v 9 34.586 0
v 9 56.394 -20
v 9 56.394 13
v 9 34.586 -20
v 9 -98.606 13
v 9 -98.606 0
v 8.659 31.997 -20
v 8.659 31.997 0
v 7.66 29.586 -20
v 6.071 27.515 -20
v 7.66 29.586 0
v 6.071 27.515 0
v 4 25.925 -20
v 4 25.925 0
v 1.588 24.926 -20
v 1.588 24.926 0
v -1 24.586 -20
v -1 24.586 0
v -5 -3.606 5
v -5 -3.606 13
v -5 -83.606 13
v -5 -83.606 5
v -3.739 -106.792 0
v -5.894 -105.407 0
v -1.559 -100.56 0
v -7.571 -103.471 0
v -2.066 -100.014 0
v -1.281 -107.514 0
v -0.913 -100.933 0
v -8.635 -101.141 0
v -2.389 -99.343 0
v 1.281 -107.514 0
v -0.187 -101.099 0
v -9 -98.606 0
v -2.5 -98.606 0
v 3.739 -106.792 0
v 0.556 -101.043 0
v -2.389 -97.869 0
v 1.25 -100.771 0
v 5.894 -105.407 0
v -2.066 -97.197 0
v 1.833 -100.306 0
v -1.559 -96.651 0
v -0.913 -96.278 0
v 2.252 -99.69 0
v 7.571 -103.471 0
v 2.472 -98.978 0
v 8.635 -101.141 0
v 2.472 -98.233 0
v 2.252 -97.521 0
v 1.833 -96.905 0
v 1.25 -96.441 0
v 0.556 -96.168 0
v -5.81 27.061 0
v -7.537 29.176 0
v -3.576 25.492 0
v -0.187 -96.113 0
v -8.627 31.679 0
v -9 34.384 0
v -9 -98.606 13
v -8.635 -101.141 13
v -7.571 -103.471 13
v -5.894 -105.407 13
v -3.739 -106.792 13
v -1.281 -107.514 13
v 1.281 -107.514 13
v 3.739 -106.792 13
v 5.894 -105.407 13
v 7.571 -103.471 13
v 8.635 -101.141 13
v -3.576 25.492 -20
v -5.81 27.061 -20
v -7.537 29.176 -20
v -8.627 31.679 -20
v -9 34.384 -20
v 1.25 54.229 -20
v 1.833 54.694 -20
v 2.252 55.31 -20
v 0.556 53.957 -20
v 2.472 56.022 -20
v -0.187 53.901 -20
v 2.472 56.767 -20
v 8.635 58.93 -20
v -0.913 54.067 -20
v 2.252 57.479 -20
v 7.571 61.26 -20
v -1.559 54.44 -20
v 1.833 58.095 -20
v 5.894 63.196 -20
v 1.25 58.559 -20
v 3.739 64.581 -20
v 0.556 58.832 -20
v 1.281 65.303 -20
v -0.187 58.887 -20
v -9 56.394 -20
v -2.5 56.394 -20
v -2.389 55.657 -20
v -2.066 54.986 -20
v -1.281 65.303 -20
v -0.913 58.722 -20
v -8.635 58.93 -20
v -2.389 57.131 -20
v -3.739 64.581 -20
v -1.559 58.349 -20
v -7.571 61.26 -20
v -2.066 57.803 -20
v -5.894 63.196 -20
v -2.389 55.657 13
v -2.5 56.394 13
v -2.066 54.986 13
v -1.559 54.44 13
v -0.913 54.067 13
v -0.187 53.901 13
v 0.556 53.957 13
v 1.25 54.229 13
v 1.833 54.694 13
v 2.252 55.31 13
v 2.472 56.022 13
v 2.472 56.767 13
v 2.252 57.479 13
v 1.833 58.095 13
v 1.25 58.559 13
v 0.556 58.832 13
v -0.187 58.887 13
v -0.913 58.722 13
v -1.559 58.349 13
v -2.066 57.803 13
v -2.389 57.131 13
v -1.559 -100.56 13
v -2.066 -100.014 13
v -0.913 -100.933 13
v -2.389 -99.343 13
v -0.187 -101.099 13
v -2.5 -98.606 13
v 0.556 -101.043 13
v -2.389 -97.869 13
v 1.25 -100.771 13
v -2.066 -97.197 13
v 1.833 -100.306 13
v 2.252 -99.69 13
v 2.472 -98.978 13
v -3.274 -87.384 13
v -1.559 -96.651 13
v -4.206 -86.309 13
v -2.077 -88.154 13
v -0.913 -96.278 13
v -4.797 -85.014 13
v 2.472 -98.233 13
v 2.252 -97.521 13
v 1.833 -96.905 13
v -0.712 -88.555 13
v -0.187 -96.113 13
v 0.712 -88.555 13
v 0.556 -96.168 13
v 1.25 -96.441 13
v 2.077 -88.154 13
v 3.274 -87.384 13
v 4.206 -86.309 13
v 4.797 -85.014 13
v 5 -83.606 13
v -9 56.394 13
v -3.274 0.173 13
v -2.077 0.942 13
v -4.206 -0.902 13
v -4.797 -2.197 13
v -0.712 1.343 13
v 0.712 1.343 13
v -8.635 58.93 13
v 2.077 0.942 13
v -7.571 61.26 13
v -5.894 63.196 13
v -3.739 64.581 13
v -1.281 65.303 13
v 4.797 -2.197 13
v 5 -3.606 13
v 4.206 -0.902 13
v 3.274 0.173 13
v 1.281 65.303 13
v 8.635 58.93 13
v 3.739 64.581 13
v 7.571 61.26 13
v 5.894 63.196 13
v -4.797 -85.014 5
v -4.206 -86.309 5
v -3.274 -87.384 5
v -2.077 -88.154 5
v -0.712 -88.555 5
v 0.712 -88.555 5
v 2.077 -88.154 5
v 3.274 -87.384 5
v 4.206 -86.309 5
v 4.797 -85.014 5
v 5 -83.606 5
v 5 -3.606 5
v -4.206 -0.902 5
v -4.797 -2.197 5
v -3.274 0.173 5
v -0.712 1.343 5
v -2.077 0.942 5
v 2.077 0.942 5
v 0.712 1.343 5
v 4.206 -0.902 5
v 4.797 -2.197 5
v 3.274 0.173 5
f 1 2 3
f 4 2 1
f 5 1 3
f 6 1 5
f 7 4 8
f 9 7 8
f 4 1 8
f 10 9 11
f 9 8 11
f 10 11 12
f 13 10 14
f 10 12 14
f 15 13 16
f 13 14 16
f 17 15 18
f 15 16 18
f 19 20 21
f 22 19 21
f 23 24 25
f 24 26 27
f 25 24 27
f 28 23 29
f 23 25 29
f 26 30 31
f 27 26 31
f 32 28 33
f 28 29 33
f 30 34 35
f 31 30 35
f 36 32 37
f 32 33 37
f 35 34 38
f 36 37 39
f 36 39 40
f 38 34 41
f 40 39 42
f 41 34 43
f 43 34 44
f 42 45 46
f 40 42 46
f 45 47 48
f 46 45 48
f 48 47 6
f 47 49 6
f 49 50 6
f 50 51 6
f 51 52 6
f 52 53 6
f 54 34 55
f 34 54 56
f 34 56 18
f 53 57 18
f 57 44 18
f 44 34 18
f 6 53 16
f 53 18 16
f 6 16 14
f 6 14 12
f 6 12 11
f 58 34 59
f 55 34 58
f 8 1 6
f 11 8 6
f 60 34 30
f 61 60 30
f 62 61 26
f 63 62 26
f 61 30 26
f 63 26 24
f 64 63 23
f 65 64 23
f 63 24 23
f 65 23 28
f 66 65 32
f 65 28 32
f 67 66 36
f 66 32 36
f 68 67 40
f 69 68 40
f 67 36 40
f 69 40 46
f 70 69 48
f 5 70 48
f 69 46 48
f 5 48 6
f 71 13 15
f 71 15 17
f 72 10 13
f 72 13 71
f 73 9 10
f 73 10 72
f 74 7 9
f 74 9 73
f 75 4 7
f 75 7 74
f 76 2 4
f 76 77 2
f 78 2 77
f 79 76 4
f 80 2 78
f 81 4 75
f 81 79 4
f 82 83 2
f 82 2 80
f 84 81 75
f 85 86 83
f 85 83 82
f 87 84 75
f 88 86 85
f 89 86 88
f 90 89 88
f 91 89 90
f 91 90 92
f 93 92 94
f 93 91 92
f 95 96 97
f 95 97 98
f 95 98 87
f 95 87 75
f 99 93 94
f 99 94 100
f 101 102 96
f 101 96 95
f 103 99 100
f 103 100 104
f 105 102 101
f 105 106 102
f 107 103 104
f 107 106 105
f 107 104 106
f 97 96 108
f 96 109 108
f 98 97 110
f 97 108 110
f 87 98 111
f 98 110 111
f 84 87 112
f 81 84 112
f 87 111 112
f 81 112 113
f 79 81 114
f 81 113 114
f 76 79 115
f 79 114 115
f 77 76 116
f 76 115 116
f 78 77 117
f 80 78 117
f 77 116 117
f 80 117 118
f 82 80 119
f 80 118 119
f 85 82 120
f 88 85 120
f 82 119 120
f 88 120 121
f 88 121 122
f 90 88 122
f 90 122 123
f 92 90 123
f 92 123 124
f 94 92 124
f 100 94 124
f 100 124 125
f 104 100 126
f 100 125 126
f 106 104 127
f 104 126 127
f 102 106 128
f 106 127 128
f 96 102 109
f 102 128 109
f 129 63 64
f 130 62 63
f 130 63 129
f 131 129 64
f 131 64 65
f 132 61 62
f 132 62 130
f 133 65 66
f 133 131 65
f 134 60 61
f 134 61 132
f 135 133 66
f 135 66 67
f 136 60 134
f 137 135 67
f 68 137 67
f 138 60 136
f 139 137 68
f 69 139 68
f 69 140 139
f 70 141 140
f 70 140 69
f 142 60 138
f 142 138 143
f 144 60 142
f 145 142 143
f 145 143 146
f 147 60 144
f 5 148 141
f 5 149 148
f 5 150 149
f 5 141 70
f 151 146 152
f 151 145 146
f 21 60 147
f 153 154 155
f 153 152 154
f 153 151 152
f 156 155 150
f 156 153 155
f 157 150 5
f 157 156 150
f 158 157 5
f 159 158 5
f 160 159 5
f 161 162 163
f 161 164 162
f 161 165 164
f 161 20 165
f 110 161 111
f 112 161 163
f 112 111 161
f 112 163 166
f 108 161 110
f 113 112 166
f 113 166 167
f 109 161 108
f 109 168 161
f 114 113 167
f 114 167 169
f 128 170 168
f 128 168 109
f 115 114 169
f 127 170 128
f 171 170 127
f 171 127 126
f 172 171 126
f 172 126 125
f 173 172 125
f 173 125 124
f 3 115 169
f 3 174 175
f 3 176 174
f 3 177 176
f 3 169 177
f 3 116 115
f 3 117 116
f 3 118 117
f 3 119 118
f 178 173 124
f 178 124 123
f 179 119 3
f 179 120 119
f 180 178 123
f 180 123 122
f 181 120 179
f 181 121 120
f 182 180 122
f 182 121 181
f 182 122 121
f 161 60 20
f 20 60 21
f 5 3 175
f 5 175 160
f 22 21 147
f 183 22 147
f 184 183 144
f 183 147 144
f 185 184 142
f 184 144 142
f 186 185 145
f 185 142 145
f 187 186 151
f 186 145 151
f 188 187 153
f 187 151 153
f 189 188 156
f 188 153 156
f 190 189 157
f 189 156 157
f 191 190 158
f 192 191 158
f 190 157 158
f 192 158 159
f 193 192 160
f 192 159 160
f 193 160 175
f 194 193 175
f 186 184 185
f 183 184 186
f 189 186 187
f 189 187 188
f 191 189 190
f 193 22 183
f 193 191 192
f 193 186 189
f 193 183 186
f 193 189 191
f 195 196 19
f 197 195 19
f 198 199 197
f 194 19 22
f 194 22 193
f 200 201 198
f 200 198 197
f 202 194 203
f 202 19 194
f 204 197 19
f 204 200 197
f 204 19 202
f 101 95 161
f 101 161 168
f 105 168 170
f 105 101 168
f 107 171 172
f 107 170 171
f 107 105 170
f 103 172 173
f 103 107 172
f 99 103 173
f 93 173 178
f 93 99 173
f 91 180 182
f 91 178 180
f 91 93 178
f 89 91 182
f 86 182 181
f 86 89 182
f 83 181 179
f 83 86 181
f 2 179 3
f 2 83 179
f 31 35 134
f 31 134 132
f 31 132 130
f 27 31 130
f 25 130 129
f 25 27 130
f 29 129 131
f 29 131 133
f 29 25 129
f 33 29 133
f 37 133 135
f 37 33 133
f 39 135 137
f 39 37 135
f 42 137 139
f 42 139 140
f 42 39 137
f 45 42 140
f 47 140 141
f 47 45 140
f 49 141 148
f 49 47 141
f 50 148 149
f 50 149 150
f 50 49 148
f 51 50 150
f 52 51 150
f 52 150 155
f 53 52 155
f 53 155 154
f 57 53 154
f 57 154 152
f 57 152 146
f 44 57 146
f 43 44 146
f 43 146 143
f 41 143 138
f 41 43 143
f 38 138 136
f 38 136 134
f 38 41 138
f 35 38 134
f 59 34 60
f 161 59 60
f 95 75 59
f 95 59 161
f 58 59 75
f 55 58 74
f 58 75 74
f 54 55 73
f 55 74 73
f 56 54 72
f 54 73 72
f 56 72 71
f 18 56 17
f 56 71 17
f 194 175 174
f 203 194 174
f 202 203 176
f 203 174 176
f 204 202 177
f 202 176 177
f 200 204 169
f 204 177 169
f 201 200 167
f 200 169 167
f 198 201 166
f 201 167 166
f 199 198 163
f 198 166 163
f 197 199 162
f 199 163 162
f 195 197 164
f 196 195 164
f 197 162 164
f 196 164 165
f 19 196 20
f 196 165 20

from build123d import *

# Parameters (mm, degrees)
SKETCH1_R      = 2.5
EXTRUDE1_DEPTH = 13
EXTRUDE2_DEPTH = 8
EXTRUDE3_START = 20
EXTRUDE3_DEPTH = 20
FILLET1_R      = 10
FILLET2_R      = 10
SKETCH4_R      = 2.5
EXTRUDE4_DEPTH = 113.911387675


with BuildPart() as part:
    # Sketch1 → Extrude1 (new body)
    with BuildSketch(Plane.XY):
        with BuildLine():
            Line((-9, 56.394324189), (-9, -98.605675811))
            ThreePointArc((-9, -98.605675811), (0, -107.605675811), (9, -98.605675811))
            Line((9, -98.605675811), (9, 56.394324189))
            ThreePointArc((9, 56.394324189), (0, 65.394324189), (-9, 56.394324189))
        make_face()
        with Locations(Location((0, 56.394324189, 0), (0, 0, 180))):
            Circle(SKETCH1_R, mode=Mode.SUBTRACT)
        with Locations(Location((0, -98.605675811, 0), (0, 0, 180))):
            Circle(SKETCH1_R, mode=Mode.SUBTRACT)
    extrude(amount=EXTRUDE1_DEPTH)

    # Sketch2 → Extrude2 (cut)
    with BuildSketch(Plane.XY.offset(13)):
        with BuildLine():
            Line((-5, -3.605675811), (-5, -83.605675811))
            ThreePointArc((-5, -83.605675811), (0, -88.605675811), (5, -83.605675811))
            Line((5, -83.605675811), (5, -3.605675811))
            ThreePointArc((5, -3.605675811), (0, 1.394324189), (-5, -3.605675811))
        make_face()
    extrude(amount=-EXTRUDE2_DEPTH, mode=Mode.SUBTRACT)

    # Sketch3 → Extrude3 (add)
    with BuildSketch(Plane(origin=(0, 0, 0), x_dir=(-1, 0, 0), z_dir=(0, 0, -1)).offset(EXTRUDE3_START)):
        with BuildLine():
            Line((-9, 56.394324189), (-9, 24.585637313))
            Line((-9, 24.585637313), (9, 24.585637313))
            Line((9, 24.585637313), (9, 56.394324189))
            ThreePointArc((9, 56.394324189), (0, 65.394324189), (-9, 56.394324189))
        make_face()
    extrude(amount=-EXTRUDE3_DEPTH)

    # Fillet1
    fillet1_edges = [part.edges().sort_by_distance(p)[0] for p in [
        (9, 24.585637313, -10),
    ]]
    fillet(fillet1_edges, radius=FILLET1_R)

    # Fillet2
    # the kernel refuses this fillet: 10 mm, written as the material it takes off along each edge
    with BuildSketch(Plane(origin=(-9, 24.585637313, -44.494897428), x_dir=(0, 1, 0), z_dir=(0, 0, 1))) as fillet2_piece_1:
        with BuildLine():
            CenterArc((9.797958971, -10), FILLET2_R, 90, 78.463040967)
            Line((0, -8), (-0.195959179, -7.96))
            ThreePointArc((-0.195959179, -7.96), (-0.2, -4), (-0.2, 0))
            Line((-0.2, 0), (0, 0.2))
            Line((0, 0.2), (9.797958971, 0.2))
            Line((9.797958971, 0.2), (9.797958971, 0))
        make_face()
    extrude(amount=44.494897428, mode=Mode.SUBTRACT)

    # Sketch4 → Extrude4 (cut, through all)
    with BuildSketch(Plane.XY.offset(13)):
        with Locations(Location((0, 56.394324189, 0), (0, 0, 180))):
            Circle(SKETCH4_R)
    extrude(amount=-EXTRUDE4_DEPTH, mode=Mode.SUBTRACT)


solid = part.part
